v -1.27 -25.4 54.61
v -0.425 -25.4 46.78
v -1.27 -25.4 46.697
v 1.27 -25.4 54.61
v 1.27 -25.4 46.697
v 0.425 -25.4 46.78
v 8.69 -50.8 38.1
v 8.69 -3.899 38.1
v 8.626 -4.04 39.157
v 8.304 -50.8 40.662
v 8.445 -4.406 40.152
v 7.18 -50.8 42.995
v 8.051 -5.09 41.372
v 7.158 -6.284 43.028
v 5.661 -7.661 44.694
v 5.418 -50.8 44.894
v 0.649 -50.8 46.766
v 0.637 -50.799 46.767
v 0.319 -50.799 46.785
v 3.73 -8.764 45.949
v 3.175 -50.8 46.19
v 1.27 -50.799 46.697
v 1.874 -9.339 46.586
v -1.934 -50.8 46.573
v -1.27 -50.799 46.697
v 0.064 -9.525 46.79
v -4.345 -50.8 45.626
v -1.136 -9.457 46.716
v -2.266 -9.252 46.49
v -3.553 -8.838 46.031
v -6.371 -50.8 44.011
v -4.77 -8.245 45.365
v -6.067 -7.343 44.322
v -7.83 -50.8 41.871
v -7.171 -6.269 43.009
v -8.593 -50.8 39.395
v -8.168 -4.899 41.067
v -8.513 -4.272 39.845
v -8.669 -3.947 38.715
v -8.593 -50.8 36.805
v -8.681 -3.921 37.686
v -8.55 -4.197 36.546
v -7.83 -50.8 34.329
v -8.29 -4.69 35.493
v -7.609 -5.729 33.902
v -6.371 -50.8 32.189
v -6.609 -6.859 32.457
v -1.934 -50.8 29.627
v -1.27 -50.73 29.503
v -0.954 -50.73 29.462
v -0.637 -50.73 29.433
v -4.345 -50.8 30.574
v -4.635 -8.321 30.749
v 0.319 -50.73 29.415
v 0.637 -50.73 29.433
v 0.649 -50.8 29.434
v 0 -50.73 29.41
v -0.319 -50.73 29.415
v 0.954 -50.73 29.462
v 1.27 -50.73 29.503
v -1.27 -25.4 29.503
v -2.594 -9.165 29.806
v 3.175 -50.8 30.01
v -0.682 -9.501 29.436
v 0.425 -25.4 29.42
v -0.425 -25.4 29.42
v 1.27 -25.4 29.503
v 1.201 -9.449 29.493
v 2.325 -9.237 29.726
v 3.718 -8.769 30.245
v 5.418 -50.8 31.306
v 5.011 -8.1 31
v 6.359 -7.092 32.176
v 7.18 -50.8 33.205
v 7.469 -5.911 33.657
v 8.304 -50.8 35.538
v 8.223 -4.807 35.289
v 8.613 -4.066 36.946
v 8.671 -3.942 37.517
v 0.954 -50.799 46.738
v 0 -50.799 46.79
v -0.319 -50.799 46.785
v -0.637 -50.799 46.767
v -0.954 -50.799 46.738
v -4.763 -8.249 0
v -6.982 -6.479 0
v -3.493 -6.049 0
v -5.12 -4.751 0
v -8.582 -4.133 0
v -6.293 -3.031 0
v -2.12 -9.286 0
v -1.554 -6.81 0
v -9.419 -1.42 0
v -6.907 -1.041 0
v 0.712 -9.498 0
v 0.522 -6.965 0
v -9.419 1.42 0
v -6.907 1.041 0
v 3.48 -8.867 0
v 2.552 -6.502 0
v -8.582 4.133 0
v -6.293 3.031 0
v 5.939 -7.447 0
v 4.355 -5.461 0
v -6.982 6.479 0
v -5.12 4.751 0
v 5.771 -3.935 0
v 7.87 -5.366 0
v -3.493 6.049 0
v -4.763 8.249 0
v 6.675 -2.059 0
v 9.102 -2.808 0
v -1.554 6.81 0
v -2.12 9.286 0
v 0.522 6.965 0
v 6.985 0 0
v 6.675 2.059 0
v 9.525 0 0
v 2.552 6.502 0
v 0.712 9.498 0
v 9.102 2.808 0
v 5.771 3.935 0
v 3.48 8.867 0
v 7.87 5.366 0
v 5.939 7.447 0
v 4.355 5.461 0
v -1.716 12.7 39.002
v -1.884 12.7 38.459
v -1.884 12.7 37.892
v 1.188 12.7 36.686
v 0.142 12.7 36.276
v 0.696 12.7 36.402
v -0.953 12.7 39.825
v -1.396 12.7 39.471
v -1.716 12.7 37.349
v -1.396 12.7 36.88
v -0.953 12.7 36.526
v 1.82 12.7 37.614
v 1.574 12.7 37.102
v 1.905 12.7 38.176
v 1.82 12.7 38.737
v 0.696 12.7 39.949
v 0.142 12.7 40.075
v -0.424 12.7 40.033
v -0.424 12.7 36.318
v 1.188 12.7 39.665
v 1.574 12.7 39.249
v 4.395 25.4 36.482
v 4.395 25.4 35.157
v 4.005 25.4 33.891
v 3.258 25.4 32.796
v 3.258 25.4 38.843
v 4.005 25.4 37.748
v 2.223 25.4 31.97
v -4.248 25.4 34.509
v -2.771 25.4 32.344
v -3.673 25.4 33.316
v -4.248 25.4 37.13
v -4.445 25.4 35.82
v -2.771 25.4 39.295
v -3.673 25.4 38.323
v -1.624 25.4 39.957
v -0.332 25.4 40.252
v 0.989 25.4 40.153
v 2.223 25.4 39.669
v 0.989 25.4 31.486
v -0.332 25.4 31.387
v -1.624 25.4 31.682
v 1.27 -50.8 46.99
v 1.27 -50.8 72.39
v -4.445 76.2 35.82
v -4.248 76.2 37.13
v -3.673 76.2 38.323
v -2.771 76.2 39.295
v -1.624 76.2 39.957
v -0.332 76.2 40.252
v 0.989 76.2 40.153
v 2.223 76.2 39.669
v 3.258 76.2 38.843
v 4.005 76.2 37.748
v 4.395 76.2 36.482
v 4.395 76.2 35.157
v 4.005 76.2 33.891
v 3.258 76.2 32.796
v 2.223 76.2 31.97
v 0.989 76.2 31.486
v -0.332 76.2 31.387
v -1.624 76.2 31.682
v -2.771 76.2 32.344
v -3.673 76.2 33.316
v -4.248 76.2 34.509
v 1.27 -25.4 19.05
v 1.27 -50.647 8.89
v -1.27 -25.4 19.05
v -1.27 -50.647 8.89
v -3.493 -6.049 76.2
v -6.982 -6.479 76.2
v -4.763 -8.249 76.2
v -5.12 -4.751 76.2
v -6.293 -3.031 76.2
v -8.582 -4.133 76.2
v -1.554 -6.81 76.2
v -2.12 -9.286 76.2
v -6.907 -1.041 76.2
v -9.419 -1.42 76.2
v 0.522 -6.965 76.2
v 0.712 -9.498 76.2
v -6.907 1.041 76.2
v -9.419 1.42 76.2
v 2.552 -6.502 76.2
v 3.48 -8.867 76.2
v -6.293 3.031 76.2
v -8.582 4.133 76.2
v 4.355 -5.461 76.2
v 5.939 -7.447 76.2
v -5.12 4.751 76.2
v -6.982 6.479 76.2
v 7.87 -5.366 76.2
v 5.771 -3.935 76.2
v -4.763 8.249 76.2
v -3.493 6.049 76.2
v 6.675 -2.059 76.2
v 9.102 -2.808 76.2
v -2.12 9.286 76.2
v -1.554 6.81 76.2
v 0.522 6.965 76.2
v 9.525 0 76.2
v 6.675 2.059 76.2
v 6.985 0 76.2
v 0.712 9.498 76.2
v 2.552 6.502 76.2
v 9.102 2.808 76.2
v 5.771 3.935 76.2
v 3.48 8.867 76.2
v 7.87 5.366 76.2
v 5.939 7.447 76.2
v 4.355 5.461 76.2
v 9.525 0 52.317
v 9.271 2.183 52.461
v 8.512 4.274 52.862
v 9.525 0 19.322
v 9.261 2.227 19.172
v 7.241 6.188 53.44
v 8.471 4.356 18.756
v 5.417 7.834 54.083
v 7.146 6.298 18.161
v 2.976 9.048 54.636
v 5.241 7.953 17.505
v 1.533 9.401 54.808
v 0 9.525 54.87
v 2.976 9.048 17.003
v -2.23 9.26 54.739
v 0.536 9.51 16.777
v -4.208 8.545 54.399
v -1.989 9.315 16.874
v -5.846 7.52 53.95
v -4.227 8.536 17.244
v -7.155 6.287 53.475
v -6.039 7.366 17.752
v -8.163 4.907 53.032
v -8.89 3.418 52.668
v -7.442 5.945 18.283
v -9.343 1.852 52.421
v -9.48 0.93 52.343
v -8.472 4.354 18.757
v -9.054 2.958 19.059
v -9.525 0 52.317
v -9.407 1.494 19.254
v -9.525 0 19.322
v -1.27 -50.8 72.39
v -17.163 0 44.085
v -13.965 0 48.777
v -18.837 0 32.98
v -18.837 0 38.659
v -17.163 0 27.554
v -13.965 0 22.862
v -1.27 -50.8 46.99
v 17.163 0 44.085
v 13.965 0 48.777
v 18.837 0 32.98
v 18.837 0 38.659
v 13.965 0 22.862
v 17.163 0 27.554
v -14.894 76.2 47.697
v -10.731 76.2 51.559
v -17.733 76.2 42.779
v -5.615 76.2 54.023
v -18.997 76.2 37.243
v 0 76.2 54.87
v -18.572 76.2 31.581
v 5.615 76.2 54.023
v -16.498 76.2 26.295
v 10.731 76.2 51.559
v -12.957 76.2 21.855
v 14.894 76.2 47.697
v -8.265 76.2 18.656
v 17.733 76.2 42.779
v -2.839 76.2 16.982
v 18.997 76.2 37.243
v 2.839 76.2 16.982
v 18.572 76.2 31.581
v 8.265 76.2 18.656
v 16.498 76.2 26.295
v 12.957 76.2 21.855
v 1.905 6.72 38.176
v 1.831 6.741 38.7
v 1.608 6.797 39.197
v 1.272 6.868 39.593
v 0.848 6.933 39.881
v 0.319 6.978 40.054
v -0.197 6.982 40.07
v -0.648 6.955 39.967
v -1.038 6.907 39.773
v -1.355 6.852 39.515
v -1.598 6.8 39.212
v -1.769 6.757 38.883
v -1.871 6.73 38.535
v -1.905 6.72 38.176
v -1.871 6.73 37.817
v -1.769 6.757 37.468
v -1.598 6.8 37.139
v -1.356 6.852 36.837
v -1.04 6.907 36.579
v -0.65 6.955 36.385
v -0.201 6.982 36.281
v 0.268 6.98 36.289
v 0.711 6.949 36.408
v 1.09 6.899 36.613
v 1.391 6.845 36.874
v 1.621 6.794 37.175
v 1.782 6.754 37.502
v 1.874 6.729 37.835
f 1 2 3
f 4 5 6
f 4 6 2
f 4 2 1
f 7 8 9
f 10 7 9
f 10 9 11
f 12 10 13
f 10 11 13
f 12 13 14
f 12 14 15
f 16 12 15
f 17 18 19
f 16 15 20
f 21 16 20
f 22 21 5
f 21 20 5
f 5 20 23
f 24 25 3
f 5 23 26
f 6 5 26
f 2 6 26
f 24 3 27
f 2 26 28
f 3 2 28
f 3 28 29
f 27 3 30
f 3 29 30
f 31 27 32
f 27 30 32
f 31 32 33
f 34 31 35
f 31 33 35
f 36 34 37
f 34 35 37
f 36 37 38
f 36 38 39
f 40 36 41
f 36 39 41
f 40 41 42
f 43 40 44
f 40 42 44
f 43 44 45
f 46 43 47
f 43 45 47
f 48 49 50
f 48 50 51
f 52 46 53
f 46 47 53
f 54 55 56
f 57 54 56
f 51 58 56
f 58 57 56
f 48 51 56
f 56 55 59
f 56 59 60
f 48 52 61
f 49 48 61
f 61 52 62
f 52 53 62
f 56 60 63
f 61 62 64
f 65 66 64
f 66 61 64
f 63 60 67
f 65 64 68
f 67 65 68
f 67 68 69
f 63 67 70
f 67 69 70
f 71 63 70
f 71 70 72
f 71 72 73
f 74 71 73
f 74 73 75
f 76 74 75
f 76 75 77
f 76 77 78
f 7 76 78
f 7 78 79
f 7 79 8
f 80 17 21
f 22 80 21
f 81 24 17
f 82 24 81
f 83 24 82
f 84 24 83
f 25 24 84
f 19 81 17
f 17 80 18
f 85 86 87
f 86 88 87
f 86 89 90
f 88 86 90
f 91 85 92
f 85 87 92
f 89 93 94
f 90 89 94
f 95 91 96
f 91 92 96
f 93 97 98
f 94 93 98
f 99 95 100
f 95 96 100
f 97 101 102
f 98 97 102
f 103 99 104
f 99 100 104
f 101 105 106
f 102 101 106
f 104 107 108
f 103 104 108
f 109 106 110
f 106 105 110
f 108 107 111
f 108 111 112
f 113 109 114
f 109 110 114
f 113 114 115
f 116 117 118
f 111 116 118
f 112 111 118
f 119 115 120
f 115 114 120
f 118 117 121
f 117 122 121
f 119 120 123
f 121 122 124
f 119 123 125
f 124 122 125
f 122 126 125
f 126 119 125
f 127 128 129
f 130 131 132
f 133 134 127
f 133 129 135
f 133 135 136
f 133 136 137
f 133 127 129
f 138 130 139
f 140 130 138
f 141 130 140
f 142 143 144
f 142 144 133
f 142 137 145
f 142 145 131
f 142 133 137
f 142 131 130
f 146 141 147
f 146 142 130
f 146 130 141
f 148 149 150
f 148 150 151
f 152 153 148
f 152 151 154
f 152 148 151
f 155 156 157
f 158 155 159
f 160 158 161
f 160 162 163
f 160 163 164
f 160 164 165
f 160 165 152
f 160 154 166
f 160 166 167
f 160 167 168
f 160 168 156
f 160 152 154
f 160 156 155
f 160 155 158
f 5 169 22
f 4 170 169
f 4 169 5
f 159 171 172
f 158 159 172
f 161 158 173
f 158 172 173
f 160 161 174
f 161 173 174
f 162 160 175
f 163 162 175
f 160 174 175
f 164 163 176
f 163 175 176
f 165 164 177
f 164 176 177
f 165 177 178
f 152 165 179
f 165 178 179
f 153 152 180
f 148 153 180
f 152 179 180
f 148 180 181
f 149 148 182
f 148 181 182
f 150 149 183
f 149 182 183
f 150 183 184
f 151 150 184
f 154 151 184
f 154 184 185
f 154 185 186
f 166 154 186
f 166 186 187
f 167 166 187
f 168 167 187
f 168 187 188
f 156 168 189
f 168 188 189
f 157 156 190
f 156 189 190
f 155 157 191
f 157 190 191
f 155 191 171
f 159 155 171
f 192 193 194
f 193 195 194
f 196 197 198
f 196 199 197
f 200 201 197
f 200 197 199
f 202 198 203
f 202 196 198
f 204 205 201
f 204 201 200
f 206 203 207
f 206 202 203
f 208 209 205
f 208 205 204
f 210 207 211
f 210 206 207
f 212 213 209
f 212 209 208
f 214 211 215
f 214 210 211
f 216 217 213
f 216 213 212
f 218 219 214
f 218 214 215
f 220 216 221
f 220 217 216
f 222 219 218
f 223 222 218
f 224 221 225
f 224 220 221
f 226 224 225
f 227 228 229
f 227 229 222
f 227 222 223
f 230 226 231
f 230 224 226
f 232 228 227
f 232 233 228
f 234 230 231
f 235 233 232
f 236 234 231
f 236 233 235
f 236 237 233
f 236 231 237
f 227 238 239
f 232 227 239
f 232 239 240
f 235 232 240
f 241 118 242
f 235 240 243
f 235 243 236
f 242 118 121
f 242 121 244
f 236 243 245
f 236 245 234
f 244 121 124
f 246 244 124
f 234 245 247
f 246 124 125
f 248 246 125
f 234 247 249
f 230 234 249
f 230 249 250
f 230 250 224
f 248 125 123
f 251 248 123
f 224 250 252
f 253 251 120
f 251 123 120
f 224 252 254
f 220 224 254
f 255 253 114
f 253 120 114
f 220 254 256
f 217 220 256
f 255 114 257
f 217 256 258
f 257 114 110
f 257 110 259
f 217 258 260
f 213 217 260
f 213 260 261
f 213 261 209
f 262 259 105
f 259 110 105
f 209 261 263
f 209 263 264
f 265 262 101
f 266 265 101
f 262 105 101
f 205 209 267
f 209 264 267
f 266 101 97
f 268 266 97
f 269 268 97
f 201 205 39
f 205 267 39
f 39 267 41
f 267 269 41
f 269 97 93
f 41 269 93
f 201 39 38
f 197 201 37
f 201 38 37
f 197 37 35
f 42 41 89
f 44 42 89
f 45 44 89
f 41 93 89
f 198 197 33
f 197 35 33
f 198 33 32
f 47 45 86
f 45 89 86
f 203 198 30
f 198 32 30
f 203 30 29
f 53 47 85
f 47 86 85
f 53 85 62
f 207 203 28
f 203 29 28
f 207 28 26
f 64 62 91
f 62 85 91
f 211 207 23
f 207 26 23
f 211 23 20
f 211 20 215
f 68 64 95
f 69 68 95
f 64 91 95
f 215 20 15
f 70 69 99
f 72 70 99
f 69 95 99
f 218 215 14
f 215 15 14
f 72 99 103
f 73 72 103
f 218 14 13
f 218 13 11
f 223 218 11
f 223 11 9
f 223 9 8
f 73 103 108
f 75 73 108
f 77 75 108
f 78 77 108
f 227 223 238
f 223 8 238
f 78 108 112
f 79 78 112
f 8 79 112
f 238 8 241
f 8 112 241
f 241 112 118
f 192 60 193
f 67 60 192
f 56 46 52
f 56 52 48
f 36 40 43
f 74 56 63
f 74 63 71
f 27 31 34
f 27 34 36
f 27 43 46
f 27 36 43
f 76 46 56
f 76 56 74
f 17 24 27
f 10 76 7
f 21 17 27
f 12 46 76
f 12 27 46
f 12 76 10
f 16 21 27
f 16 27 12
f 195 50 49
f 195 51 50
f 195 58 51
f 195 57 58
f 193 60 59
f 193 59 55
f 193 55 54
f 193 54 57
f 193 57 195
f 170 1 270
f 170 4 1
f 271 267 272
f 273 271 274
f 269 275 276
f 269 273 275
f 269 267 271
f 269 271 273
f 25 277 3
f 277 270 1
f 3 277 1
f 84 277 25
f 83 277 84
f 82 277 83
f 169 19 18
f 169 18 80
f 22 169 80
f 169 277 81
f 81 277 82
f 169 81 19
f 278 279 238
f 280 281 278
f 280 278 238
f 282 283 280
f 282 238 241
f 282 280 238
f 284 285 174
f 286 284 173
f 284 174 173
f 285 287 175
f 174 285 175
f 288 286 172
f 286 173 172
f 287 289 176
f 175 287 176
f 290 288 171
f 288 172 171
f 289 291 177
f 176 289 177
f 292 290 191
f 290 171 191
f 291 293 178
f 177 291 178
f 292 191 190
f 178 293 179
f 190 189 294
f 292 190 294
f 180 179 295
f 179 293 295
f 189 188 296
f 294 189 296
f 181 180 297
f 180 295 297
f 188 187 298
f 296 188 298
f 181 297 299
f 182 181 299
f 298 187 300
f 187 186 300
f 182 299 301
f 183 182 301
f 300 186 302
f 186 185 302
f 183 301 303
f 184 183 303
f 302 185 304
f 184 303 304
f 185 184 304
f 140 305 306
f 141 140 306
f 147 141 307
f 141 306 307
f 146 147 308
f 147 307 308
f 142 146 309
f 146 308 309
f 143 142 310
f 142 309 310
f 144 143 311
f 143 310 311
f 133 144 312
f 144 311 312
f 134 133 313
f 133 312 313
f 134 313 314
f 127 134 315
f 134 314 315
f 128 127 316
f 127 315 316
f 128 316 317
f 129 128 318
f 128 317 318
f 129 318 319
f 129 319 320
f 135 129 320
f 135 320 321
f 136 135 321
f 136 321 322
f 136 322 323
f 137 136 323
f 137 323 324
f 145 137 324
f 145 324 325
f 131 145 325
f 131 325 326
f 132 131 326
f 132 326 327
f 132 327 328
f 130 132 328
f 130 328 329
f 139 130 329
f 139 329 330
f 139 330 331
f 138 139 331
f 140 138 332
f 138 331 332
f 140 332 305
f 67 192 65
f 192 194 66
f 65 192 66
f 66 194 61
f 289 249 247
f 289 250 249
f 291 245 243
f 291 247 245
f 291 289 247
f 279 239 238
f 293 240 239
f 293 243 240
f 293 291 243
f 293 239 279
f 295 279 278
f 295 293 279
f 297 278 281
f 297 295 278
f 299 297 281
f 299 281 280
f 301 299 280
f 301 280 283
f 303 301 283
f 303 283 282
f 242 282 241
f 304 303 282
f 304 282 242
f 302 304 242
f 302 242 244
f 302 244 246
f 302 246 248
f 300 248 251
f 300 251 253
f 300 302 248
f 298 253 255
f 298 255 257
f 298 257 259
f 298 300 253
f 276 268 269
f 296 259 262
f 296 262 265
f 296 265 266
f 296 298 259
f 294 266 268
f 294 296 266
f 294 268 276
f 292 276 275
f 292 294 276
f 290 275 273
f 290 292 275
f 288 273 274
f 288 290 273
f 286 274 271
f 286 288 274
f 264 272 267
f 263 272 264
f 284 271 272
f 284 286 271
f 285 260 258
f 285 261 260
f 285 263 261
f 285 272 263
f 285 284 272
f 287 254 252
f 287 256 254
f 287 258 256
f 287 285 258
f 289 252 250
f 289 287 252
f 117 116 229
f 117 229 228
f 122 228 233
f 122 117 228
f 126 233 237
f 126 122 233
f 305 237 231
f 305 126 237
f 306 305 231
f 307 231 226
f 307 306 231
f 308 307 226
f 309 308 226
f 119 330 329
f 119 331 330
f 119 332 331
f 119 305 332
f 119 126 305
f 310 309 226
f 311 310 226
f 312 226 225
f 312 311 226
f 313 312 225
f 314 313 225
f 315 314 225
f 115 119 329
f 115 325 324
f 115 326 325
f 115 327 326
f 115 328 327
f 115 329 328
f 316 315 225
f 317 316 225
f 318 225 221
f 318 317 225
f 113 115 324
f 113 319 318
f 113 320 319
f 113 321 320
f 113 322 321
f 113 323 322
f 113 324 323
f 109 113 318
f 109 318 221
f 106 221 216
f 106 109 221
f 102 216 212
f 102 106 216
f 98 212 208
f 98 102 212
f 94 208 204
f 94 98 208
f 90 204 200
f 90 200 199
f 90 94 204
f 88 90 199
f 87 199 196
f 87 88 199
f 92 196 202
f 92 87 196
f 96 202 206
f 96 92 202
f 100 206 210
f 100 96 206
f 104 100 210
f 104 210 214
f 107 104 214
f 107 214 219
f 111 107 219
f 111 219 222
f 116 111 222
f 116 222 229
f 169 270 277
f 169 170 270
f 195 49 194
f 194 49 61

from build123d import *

# Parameters (mm, degrees)
F0_R          = 9.525
F0_R_2        = 6.985
F1_DEPTH      = 76.2
F2_R          = 8.690434
F3_DEPTH      = 50.8
F5_DEPTH      = 1.27
F5_DEPTH_BACK = 1.27
F6_R          = 6.985
F7_DEPTH      = 76.2
F8_W          = 76.2
F8_H          = 19.05
F10_R         = 4.445
F11_DEPTH     = 50.8
F12_DEPTH     = 87.884
F13_R         = 1.905
F14_DEPTH     = 12.7


with BuildPart() as f1:
    # F0 (on Top) → F1 (new body)
    with BuildSketch(Plane.XY):
        Circle(F0_R)
        Circle(F0_R_2, mode=Mode.SUBTRACT)
    extrude(amount=F1_DEPTH)

    # F2 (on Front) → F3 (join)
    with BuildSketch(Plane.XZ):
        with Locations((0, 38.1)):
            Circle(F2_R)
    extrude(amount=F3_DEPTH)

    # F4 (on Right) → F5 (join, two sides)
    with BuildSketch(Plane.YZ) as f5_sk:
        Polygon((-50.8, 72.39), (-50.8, 46.99), (-25.4, 46.99), (-25.4, 54.61), align=None)
        Polygon((-25.4, 46.99), (-50.8, 46.99), (-50.647298, 8.890306), (-25.4, 19.05), align=None)
    extrude(amount=F5_DEPTH)
    extrude(f5_sk.sketch, amount=-F5_DEPTH_BACK)

    # F6 (on Top) → F7 (cut)
    with BuildSketch(Plane.XY):
        Circle(F6_R)
    extrude(amount=F7_DEPTH, mode=Mode.SUBTRACT)

    # F8 (on Right) → F9 (revolve)
    with BuildSketch(Plane.YZ):
        with Locations((38.1, 45.344532)):
            Rectangle(F8_W, F8_H)
    revolve(axis=Axis((0, 44.6622, 35.819532), (0, 1, 0)))

    # F10 (on face) → F11 (cut)
    with BuildSketch(Plane(origin=(0, 76.2, 0), x_dir=(-1, 0, 0), z_dir=(0, 1, 0))):
        with Locations((0, 35.819532)):
            Circle(F10_R)
    extrude(amount=-F11_DEPTH, mode=Mode.SUBTRACT)

    # F6 (on Top) → F12 (cut)
    with BuildSketch(Plane.XY):
        Circle(F6_R)
    extrude(amount=F12_DEPTH, mode=Mode.SUBTRACT)

    # F13 (on Front) → F14 (cut)
    with BuildSketch(Plane.XZ):
        with Locations((0, 38.175505)):
            Circle(F13_R)
    extrude(amount=-F14_DEPTH, mode=Mode.SUBTRACT)


solid = f1.part
